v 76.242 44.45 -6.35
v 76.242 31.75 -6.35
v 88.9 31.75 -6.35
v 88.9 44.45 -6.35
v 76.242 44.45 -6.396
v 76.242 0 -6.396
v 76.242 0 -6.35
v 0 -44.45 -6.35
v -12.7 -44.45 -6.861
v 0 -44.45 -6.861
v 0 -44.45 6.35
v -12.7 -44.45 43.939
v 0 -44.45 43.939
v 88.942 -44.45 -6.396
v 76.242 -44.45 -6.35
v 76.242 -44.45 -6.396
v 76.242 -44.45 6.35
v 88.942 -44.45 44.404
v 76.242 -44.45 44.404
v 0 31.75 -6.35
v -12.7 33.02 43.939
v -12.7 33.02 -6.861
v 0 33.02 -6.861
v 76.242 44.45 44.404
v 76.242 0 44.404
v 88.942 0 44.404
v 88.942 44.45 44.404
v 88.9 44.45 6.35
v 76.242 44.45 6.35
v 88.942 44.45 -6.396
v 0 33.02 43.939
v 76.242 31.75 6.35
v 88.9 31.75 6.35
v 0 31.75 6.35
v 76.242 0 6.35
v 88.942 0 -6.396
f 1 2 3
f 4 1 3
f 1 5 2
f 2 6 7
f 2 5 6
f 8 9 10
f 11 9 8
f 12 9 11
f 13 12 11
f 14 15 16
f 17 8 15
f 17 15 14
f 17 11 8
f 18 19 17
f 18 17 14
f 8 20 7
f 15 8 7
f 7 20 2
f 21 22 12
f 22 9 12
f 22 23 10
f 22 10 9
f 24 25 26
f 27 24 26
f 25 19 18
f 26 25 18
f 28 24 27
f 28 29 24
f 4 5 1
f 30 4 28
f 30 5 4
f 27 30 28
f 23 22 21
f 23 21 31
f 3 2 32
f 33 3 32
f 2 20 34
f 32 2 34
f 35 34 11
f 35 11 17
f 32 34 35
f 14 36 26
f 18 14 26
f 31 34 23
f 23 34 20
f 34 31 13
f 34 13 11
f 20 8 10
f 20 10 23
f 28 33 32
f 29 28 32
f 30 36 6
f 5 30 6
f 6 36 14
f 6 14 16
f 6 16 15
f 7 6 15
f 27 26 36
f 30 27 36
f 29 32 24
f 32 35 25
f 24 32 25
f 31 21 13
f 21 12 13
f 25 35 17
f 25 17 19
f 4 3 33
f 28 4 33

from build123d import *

# Parameters (mm, degrees)
F0_W      = 63.5
F0_H      = 12.7
F1_DEPTH  = 88.9
F2_W      = 12.7
F2_H      = 50.8
F3_DEPTH  = 44.45
F1_FACE_W = 88.9
F1_FACE_H = 12.7
F4_DEPTH  = 12.7
F5_DEPTH  = 33.02
F6_W      = 12.7
F6_H      = 50.8
F7_DEPTH  = 44.45
F8_DEPTH  = 44.45


with BuildPart() as f1:
    # F0 (on Right) → F1 (new body)
    with BuildSketch(Plane.YZ):
        Rectangle(F0_W, F0_H)
    extrude(amount=F1_DEPTH)

    # F2 (on Front) → F3 (join)
    with BuildSketch(Plane.XZ):
        with Locations((-6.35, 18.538677)):
            Rectangle(F2_W, F2_H)
    extrude(amount=F3_DEPTH)

    # F1_face (on face) → F4 (join)
    with BuildSketch(Plane(origin=(44.45, -31.75, 0), x_dir=(1, 0, 0), z_dir=(0, -1, 0))):
        Rectangle(F1_FACE_W, F1_FACE_H)
    extrude(amount=F4_DEPTH)

    # F3_face (on face) → F5 (join)
    with BuildSketch(Plane(origin=(-6.35, 0, 18.538677), x_dir=(1, 0, 0), z_dir=(0, 1, 0))):
        Polygon((6.35, 24.888677), (6.35, 25.4), (-6.35, 25.4), (-6.35, -25.4), (6.35, -25.4), (6.35, 12.188677), align=None)
    extrude(amount=F5_DEPTH)

    # F6 (on Front) → F7 (join)
    with BuildSketch(Plane.XZ):
        with Locations((82.592454, 19.003852)):
            Rectangle(F6_W, F6_H)
    extrude(amount=F7_DEPTH)

    # F7_face (on face) → F8 (join)
    with BuildSketch(Plane(origin=(82.599499, 0, 25.310266), x_dir=(1, 0, 0), z_dir=(0, 1, 0))):
        Polygon((-6.357044, -19.093586), (6.342956, -19.093586), (6.342956, 31.706414), (-6.357044, 31.706414), (-6.357044, 31.660266), (6.300501, 31.660266), (6.300501, 18.960266), (-6.357044, 18.960266), align=None)
    extrude(amount=F8_DEPTH)


solid = f1.part
